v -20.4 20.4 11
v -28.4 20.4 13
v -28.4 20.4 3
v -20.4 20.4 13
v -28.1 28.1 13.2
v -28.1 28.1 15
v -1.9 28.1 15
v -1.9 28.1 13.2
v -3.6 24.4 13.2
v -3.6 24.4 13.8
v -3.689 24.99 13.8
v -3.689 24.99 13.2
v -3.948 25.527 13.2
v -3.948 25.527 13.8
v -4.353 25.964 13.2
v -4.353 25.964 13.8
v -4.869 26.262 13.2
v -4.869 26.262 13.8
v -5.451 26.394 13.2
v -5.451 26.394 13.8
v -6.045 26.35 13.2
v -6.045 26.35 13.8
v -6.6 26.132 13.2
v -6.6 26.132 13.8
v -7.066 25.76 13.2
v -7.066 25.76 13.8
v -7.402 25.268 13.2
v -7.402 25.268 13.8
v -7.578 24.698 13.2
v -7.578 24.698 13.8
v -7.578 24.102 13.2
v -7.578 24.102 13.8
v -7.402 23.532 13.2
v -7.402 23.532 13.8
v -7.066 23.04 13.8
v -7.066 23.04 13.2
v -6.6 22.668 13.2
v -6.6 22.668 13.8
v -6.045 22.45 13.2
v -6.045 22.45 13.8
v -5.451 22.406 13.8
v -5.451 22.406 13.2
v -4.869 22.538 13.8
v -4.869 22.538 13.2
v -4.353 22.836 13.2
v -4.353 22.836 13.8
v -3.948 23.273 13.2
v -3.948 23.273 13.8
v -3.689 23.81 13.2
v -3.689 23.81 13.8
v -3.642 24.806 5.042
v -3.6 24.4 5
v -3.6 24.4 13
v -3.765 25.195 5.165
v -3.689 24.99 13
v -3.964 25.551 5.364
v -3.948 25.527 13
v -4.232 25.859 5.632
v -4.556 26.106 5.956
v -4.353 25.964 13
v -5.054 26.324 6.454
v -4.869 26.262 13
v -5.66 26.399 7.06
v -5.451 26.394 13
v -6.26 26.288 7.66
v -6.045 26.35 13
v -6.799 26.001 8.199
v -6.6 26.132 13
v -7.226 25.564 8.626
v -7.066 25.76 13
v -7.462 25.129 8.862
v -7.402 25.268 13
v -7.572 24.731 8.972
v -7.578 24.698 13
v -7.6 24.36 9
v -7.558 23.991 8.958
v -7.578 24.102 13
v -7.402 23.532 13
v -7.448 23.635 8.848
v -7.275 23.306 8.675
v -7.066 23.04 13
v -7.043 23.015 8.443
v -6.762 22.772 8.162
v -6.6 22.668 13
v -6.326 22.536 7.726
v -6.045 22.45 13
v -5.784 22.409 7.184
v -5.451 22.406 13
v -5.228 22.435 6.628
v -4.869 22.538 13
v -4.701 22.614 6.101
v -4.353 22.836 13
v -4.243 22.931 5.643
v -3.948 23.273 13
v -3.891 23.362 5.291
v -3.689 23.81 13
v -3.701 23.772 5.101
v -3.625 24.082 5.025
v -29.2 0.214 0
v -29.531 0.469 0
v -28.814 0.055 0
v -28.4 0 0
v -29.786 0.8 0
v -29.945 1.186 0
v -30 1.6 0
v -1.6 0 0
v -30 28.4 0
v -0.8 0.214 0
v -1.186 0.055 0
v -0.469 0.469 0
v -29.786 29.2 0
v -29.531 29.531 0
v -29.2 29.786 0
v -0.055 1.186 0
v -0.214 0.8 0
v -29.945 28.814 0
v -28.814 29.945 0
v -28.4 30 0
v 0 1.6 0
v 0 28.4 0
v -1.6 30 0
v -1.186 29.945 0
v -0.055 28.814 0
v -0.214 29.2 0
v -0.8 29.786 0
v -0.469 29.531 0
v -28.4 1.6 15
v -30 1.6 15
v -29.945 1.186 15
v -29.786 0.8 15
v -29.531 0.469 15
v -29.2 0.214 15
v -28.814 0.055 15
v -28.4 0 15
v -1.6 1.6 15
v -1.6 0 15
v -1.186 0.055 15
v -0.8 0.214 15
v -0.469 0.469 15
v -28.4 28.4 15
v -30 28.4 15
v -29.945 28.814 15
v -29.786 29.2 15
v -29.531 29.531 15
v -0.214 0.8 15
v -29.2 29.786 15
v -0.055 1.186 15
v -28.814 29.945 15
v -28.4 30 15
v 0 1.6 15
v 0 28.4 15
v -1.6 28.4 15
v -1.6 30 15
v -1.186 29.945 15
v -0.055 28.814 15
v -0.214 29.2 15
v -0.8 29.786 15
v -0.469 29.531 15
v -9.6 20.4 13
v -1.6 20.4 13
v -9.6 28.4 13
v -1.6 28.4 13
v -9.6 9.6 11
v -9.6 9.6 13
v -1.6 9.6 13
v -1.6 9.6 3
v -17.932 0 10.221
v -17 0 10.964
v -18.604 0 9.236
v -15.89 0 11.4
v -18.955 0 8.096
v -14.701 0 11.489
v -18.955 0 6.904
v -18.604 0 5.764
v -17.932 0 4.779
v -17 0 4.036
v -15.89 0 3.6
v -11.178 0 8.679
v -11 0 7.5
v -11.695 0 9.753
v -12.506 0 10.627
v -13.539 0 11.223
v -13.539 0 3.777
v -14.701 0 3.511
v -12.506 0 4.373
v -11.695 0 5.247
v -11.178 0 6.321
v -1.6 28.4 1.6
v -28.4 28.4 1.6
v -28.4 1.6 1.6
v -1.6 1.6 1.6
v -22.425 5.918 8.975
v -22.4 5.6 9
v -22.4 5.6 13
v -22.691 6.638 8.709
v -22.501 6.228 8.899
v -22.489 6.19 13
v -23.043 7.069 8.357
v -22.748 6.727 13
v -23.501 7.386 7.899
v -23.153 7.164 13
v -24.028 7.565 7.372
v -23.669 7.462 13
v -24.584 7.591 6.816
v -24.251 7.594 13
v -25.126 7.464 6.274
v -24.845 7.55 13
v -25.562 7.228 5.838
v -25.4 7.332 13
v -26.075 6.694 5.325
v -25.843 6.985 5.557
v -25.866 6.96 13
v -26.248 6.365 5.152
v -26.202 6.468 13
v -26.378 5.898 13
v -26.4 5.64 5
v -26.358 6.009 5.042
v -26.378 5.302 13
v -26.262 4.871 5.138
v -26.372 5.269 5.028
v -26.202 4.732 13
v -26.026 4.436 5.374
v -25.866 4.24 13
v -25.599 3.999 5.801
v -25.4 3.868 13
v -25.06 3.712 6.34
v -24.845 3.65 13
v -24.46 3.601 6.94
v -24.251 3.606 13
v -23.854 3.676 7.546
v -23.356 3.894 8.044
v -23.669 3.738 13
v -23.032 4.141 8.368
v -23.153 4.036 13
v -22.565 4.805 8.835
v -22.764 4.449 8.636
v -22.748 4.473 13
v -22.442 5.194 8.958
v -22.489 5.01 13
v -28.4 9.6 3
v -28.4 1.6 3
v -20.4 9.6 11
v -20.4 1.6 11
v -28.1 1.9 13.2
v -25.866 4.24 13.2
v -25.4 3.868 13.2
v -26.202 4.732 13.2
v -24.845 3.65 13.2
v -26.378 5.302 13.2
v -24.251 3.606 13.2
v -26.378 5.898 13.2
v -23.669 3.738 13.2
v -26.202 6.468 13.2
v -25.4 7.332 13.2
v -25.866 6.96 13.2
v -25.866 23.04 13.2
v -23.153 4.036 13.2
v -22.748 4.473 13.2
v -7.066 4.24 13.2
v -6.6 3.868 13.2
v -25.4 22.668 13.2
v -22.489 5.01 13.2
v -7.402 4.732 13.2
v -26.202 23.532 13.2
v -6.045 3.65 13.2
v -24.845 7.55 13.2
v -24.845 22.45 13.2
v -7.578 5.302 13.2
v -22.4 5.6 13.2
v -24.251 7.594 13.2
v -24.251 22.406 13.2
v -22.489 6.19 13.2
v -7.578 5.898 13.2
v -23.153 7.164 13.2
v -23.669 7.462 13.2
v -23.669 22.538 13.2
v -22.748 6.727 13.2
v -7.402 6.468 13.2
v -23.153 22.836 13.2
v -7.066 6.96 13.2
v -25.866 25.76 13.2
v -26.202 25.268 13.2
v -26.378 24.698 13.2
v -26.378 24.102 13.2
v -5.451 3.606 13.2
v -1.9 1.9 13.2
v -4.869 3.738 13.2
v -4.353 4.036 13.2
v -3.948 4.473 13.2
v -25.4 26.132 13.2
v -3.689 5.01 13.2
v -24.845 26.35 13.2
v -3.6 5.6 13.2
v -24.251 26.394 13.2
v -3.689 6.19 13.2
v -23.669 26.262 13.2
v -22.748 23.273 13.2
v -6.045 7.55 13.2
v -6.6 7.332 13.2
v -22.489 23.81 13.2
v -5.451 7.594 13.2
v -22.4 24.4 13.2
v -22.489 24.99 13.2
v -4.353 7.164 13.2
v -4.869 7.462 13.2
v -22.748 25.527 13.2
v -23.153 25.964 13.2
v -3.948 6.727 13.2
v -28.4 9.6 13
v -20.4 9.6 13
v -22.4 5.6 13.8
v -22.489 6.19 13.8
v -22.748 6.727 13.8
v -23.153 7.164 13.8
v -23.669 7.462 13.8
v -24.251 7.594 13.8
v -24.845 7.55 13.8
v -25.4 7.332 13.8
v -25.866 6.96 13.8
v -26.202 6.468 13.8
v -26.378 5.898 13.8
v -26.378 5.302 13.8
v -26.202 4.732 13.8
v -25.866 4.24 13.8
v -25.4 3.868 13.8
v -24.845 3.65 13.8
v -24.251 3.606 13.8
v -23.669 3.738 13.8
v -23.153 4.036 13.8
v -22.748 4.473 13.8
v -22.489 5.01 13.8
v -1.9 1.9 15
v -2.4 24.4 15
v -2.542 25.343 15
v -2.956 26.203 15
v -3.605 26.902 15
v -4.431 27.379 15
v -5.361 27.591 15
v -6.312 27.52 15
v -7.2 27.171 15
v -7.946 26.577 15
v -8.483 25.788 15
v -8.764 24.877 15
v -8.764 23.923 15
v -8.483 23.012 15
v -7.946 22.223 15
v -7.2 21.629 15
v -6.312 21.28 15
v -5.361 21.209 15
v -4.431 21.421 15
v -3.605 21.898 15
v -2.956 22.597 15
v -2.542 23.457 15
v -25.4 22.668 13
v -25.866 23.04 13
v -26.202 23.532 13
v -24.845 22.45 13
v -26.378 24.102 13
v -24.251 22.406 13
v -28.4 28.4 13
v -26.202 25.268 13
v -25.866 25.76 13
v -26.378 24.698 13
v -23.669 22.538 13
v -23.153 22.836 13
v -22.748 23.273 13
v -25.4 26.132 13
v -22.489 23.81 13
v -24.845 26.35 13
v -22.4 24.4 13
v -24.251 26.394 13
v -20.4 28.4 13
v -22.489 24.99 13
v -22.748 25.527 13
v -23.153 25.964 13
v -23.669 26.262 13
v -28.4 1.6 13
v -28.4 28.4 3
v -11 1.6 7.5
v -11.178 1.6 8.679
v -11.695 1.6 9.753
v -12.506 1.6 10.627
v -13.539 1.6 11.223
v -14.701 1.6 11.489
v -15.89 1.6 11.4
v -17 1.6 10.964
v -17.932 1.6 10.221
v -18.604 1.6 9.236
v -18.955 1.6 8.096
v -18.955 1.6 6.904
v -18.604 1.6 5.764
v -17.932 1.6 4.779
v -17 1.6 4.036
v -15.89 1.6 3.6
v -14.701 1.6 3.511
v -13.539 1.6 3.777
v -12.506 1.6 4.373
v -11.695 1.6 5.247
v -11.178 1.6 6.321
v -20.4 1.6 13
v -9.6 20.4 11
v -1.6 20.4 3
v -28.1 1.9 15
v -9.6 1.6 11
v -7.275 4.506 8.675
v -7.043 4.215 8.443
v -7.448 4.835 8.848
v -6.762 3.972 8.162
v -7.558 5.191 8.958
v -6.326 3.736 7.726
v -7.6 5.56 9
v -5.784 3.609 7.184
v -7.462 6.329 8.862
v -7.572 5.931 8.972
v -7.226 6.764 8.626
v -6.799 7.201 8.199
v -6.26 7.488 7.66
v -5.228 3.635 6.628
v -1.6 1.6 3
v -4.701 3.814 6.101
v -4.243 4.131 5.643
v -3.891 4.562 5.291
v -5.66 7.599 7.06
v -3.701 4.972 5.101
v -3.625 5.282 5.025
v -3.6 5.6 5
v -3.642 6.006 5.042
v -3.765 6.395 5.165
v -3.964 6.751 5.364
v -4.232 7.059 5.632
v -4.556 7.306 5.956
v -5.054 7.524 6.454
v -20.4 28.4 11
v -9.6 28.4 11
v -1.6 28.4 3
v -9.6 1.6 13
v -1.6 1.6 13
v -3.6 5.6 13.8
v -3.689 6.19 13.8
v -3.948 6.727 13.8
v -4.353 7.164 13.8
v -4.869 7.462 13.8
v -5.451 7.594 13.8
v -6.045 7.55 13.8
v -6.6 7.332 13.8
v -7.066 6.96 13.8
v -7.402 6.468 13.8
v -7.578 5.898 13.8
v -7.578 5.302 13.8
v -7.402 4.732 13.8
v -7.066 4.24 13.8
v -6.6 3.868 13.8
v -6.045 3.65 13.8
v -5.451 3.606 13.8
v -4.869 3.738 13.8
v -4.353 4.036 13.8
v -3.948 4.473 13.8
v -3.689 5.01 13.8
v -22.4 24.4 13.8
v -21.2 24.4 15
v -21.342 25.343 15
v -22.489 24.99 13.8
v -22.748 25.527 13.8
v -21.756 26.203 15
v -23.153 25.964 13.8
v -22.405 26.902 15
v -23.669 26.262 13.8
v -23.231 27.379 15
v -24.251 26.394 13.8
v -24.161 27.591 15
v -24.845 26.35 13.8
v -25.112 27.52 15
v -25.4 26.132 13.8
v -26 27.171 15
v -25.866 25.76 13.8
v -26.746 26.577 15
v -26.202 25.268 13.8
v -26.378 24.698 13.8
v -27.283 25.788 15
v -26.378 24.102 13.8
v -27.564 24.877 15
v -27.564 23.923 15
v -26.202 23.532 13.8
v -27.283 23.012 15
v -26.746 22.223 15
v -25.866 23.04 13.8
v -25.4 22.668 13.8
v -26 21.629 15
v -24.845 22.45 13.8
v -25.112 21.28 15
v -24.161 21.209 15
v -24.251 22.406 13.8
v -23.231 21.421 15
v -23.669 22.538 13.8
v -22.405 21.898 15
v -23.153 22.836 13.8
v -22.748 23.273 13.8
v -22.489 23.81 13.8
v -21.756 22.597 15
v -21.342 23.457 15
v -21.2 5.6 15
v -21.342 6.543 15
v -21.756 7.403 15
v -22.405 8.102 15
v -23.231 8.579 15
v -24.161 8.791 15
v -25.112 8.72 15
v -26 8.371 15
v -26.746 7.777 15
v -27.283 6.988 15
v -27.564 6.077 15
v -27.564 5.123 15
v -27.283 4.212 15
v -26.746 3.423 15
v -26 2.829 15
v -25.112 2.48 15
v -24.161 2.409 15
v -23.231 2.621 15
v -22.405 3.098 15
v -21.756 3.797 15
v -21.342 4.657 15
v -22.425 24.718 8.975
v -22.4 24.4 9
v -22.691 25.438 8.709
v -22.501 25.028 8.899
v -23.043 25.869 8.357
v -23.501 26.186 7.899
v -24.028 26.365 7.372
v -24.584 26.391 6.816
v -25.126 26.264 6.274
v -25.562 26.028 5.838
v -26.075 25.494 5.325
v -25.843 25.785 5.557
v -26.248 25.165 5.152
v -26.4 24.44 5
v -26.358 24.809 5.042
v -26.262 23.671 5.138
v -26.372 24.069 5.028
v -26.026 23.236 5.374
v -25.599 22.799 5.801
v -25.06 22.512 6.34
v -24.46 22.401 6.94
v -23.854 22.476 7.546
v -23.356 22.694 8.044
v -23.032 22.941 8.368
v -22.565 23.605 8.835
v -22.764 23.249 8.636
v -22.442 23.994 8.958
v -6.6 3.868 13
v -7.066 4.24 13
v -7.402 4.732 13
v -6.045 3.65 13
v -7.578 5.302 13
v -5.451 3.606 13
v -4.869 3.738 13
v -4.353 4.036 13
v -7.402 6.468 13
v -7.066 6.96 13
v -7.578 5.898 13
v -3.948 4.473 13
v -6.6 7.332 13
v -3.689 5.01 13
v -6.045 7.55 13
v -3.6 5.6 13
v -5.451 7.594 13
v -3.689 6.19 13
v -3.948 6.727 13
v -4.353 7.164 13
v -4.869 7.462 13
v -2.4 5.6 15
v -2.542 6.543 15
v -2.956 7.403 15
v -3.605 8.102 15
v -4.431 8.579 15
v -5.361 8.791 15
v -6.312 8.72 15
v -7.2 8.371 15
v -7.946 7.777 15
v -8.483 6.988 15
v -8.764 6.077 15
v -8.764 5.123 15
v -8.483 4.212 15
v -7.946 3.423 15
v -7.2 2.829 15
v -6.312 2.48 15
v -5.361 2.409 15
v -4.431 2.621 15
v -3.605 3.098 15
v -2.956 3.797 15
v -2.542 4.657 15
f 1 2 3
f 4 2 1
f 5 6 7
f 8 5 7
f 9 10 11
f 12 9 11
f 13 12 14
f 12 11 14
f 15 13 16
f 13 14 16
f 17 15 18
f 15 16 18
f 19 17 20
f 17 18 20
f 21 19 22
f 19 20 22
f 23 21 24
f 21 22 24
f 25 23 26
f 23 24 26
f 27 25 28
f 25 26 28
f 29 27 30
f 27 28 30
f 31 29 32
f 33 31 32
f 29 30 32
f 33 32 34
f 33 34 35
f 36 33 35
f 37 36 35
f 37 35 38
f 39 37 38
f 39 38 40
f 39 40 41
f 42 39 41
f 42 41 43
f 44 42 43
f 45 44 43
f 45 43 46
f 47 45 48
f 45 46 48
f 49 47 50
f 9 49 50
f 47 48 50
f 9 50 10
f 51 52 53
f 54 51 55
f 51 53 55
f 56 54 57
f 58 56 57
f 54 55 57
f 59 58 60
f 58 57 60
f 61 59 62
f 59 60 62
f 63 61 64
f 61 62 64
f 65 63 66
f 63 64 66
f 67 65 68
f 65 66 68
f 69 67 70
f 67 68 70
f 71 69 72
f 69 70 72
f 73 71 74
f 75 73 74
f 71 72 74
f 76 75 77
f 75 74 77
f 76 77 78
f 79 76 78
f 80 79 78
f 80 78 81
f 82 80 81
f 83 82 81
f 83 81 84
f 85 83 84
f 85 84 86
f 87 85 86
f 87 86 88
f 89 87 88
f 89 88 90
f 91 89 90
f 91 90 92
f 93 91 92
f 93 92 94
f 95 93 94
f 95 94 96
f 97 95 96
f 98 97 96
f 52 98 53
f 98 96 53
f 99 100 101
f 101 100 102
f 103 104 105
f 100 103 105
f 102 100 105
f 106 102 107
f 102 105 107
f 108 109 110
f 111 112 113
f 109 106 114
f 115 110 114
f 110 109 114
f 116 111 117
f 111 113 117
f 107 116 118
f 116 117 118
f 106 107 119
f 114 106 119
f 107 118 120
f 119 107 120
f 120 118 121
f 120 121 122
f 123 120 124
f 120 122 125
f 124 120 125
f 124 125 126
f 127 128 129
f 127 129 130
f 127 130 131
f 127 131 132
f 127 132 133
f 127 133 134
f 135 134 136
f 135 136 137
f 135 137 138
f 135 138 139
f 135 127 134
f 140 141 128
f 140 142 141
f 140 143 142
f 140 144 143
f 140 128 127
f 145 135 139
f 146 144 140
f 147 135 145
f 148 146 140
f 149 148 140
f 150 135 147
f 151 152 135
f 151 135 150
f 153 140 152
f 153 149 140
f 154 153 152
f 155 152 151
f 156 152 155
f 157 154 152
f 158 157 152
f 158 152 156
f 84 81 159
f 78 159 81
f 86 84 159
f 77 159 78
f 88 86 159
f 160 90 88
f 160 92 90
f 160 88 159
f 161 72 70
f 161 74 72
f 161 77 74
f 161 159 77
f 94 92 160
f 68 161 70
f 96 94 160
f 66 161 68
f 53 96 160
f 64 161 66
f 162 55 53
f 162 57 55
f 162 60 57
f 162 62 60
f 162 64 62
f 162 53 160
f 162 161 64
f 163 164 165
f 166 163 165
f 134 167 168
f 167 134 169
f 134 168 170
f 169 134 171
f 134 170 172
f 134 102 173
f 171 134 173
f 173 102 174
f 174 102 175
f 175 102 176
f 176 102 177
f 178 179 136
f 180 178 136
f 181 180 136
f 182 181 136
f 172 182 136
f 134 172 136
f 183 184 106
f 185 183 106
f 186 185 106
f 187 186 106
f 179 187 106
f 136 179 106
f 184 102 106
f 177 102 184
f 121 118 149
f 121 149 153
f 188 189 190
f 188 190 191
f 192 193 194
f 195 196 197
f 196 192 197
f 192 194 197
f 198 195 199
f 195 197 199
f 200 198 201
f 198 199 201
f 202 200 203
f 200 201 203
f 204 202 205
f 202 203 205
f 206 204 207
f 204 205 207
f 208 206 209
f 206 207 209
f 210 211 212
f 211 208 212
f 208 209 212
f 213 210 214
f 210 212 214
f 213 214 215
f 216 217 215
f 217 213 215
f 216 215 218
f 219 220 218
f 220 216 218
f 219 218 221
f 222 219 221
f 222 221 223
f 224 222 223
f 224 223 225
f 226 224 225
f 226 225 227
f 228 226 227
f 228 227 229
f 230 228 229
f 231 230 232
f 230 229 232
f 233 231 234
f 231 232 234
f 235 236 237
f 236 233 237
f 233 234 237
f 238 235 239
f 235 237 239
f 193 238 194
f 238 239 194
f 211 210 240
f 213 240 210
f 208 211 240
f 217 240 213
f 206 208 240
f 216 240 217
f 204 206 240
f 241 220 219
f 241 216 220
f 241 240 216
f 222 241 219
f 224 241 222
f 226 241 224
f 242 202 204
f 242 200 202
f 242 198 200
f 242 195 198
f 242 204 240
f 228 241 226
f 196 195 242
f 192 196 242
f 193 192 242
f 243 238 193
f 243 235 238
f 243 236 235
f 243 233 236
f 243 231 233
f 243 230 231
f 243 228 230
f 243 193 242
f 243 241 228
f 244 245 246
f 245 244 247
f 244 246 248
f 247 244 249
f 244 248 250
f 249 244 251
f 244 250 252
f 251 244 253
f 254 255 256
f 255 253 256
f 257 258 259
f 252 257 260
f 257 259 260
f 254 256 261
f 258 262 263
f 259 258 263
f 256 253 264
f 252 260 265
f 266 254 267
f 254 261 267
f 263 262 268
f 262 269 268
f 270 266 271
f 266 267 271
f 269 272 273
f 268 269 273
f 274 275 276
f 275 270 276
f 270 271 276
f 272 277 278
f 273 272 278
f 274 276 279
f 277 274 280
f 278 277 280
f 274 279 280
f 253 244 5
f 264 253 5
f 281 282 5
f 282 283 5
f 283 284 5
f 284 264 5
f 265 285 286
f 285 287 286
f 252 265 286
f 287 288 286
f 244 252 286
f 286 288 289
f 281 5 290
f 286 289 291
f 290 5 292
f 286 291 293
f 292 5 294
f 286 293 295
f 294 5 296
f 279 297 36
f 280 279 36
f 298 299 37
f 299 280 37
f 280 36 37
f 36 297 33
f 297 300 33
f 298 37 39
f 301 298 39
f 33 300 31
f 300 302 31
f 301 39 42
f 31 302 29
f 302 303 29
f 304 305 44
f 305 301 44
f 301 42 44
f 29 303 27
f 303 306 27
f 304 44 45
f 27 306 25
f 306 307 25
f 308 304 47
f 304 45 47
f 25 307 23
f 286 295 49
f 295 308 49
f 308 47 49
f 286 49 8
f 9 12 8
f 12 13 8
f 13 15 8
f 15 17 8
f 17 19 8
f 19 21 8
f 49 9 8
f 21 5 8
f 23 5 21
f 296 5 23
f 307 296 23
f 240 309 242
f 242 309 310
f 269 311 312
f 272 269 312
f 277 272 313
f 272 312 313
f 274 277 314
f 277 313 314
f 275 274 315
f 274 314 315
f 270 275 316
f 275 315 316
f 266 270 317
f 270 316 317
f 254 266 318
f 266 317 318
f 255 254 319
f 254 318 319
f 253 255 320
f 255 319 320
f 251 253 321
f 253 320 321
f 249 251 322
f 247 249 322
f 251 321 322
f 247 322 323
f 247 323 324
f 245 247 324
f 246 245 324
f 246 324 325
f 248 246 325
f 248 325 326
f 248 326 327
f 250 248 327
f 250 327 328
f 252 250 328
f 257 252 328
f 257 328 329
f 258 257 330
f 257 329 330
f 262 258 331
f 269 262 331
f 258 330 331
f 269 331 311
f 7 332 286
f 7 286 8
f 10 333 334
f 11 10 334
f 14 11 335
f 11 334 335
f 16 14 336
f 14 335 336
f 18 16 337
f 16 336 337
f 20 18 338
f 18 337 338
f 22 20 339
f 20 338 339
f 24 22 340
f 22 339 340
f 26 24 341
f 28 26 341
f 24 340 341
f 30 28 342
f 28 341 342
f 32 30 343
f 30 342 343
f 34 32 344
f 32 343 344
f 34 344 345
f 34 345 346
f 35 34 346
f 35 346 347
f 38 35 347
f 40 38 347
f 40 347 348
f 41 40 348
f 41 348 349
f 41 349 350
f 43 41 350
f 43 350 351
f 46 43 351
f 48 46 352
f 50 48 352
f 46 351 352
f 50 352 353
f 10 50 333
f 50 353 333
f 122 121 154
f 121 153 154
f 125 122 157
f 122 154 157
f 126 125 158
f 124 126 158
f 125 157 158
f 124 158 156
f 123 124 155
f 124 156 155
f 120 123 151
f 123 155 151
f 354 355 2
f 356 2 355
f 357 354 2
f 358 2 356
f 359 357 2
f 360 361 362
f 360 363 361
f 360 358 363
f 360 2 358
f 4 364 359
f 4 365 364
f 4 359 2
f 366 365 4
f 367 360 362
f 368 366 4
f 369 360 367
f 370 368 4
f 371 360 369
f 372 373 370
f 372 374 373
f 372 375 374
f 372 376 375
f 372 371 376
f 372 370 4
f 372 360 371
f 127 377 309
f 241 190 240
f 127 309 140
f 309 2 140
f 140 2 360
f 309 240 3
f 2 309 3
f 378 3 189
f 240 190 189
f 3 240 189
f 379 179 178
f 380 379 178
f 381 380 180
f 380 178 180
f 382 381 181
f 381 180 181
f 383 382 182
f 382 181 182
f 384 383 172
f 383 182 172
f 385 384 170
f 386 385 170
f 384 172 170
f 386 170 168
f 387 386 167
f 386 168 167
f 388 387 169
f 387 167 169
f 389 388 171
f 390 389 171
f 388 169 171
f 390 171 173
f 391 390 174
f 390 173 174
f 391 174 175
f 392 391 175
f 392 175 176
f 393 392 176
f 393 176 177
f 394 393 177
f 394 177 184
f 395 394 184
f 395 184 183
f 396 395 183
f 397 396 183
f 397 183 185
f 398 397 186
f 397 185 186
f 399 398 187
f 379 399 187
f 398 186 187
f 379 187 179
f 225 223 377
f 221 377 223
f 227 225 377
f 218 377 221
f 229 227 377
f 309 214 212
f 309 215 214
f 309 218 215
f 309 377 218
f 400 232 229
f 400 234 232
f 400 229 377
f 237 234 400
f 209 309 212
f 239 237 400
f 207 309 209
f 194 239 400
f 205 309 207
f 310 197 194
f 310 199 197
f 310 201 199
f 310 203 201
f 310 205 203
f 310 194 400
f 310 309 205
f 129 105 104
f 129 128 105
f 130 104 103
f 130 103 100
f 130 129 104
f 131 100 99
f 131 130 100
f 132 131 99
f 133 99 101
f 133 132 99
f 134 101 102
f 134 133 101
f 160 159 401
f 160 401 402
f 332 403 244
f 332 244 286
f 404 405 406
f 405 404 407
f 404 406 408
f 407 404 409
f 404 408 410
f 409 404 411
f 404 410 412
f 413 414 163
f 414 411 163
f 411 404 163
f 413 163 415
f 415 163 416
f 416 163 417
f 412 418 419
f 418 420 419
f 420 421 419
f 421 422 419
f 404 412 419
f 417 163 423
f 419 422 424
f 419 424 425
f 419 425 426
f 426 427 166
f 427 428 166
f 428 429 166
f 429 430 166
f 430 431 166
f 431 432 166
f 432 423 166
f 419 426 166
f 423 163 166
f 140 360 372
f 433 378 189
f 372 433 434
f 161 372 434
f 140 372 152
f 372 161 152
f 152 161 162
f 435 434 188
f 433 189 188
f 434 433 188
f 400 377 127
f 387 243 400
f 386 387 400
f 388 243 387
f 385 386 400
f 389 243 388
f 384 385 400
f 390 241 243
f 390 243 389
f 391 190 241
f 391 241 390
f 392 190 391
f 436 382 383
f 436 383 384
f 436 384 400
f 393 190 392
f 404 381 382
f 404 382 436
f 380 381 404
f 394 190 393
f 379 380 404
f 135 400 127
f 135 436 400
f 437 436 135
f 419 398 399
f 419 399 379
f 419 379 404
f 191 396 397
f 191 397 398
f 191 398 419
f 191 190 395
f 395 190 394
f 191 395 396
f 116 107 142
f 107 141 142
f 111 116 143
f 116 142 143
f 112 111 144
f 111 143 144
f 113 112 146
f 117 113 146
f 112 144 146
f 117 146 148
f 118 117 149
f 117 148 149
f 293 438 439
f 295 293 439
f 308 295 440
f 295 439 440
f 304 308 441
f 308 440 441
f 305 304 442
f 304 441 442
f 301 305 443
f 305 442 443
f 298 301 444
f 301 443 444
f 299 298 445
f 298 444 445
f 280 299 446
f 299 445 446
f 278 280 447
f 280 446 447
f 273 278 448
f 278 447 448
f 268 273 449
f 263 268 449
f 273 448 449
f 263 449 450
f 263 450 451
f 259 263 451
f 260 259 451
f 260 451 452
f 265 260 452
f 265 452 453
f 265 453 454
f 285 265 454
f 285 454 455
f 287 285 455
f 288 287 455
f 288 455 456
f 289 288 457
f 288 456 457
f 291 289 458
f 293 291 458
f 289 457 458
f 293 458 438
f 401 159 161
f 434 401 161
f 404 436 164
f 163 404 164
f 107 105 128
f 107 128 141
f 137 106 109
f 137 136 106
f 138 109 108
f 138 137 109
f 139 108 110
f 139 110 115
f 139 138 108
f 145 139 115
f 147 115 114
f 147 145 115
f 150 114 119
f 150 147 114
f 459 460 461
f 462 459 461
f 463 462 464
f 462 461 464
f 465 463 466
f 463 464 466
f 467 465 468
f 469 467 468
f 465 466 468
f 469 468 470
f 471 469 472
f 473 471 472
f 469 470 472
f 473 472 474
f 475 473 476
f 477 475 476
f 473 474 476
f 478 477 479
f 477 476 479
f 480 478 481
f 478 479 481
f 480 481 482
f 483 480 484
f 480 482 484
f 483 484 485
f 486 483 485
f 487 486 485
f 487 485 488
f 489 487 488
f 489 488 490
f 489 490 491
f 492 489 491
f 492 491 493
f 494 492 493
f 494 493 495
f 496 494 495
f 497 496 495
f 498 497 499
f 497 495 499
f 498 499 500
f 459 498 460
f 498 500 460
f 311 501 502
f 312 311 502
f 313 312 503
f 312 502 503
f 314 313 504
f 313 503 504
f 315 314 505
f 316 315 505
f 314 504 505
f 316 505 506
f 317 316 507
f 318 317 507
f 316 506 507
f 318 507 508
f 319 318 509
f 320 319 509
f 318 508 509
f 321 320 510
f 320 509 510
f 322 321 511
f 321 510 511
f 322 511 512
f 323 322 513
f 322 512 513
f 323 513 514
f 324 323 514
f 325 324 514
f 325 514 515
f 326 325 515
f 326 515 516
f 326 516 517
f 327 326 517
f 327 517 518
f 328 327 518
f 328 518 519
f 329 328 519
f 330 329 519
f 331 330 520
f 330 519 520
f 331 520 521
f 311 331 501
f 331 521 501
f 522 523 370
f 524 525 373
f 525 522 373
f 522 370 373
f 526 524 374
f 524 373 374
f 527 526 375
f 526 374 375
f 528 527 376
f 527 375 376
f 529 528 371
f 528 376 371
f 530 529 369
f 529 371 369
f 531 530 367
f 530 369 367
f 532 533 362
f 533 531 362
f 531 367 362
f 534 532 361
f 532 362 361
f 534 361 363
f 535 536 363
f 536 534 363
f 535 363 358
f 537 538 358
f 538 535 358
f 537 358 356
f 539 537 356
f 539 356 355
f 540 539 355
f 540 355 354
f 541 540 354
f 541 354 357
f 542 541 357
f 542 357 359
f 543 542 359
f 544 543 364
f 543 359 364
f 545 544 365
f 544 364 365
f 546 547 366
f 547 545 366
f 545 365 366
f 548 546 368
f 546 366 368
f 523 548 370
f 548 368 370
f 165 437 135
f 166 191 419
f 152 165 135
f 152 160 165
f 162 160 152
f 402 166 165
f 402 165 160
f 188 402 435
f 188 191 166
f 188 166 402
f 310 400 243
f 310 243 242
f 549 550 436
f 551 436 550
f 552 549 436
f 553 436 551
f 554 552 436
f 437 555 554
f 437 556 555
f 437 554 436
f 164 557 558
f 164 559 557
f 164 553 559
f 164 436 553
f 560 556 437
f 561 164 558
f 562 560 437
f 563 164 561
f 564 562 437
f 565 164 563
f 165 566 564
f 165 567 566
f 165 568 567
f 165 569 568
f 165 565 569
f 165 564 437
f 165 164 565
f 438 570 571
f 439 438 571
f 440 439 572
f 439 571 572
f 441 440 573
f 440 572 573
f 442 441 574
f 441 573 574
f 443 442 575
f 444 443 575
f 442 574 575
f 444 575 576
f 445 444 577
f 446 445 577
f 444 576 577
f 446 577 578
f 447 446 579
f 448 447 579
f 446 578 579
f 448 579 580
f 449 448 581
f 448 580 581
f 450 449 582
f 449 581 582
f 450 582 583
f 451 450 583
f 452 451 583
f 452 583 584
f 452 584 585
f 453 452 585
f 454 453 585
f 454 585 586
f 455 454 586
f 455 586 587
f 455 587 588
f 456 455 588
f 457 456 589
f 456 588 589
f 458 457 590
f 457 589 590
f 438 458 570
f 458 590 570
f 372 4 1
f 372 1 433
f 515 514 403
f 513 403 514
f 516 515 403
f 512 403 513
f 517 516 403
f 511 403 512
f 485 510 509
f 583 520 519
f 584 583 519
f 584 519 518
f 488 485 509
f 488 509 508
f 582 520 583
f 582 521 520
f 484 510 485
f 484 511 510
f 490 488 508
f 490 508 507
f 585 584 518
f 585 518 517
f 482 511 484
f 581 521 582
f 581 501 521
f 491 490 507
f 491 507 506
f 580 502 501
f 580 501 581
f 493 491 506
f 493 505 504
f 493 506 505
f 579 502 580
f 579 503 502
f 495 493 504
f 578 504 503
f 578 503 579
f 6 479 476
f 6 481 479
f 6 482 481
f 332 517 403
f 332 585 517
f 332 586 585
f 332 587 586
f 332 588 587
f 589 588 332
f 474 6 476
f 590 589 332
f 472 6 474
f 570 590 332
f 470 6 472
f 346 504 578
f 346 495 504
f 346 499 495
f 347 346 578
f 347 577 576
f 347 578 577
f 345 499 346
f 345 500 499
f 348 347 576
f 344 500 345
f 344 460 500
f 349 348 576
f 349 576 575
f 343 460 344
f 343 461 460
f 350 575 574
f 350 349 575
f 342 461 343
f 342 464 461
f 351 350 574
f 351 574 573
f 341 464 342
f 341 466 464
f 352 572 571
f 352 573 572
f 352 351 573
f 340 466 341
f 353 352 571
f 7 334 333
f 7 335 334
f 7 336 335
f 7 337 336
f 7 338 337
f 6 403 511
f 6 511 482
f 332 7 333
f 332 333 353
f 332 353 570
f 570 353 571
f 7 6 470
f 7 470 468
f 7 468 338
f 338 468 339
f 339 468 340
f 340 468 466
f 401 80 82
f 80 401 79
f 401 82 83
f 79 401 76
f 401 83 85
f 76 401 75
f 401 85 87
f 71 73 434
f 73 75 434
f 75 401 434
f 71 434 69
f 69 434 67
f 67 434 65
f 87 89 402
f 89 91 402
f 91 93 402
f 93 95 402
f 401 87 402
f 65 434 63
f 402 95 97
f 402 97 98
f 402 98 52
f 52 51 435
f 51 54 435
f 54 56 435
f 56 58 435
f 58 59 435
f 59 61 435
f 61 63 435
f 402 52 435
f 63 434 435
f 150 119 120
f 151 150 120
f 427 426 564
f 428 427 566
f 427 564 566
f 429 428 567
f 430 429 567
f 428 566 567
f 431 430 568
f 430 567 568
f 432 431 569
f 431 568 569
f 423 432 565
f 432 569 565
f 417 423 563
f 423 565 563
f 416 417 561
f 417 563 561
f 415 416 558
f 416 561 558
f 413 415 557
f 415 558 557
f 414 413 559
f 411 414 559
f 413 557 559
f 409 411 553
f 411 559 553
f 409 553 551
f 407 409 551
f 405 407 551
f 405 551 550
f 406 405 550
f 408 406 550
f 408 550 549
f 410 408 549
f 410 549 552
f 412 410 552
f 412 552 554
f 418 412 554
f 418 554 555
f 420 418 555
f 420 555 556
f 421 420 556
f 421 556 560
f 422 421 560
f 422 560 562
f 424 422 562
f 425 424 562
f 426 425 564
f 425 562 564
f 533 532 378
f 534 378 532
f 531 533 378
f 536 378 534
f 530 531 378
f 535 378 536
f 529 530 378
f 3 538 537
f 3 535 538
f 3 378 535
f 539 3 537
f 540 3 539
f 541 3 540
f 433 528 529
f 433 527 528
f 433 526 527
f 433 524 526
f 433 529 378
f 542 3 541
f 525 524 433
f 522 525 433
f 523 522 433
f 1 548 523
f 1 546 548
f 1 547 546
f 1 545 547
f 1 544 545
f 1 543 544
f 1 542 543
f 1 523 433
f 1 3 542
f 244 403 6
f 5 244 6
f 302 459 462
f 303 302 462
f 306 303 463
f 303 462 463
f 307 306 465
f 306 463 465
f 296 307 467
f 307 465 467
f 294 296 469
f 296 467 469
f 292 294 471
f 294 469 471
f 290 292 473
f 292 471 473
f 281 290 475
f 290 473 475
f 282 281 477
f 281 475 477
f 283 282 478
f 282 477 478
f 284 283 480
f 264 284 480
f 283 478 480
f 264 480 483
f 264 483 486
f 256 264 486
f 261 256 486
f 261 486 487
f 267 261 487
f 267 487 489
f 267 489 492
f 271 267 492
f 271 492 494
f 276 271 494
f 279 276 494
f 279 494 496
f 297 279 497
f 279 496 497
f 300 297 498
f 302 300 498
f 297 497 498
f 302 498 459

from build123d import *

# Parameters (mm, degrees)
F0_W         = 30
F0_H         = 30
F1_DEPTH     = 15
F2_T         = -1.6
F4_W         = 8
F4_H         = 8
F4_R         = 2
F5_DEPTH     = 10
F6_T4_DEPTH  = 28.5734639037
F6_T9_DEPTH  = 28.5734639037
F6_T14_DEPTH = 28.5734639037
F6_T19_DEPTH = 28.5734639037
F7_R         = 4
F8_DEPTH     = 1.6
F9_W         = 26.2
F9_H         = 26.2
F9_R         = 2
F10_DEPTH    = 1.8
F11_SIZE     = 1.2
F12_R        = 1.6


# Not quite as in the source:
# - a fillet or chamfer that OpenCascade refuses, or shapes differently, is made with other operations: its cross-section is extruded or revolved along the edge and cut away or added


with BuildPart() as f1:
    # F0 (on Top) → F1 (new body)
    with BuildSketch(Plane.XY):
        with Locations((-15, 15)):
            Rectangle(F0_W, F0_H)
    extrude(amount=F1_DEPTH)

    # F2
    f2_openings = [f1.faces().sort_by_distance(p)[0] for p in [
        (-15, 15, 15),
    ]]
    offset(amount=F2_T, openings=f2_openings)

    # F4 (on offset) → F5 (join)
    with BuildSketch(Plane.XY.offset(13)):
        with Locations((-24.4, 24.4)):
            Rectangle(F4_W, F4_H)
        with Locations((-24.4, 24.4)):
            Circle(F4_R, mode=Mode.SUBTRACT)
        with Locations((-5.6, 24.4)):
            Rectangle(F4_W, F4_H)
        with Locations((-5.6, 24.4)):
            Circle(F4_R, mode=Mode.SUBTRACT)
        with Locations((-5.6, 5.6)):
            Rectangle(F4_W, F4_H)
        with Locations((-5.6, 5.6)):
            Circle(F4_R, mode=Mode.SUBTRACT)
        with Locations((-24.4, 5.6)):
            Rectangle(F4_W, F4_H)
        with Locations((-24.4, 5.6)):
            Circle(F4_R, mode=Mode.SUBTRACT)
    extrude(amount=-F5_DEPTH)

    # F6: chamfer of 8 on 4 edges, made by hand


with BuildPart() as f6_tool2:
    # F6_s3 → F6_t4 (new body)
    with BuildSketch(Plane.XZ.offset(0.1734639037)):
        Polygon((-28.4, 3), (-20.4, 11), (-20.4, 3), align=None)
    extrude(amount=-F6_T4_DEPTH)

    split(bisect_by=Plane.XZ.offset(-1.6), keep=Keep.BOTTOM)


with BuildPart() as f1_1:
    add(f1.part)

    # F6_t1: cut F6_tool2
    add(f6_tool2.part, mode=Mode.SUBTRACT)


with BuildPart() as f6_tool7:
    # F6_s8 → F6_t9 (new body)
    with BuildSketch(Plane.XZ.offset(-28.4)):
        Polygon((-9.6, 11), (-1.6, 3), (-9.6, 3), align=None)
    extrude(amount=F6_T9_DEPTH)

    split(bisect_by=Plane.XZ.offset(-1.6), keep=Keep.BOTTOM)


with BuildPart() as f1_2:
    add(f1_1.part)

    # F6_t6: cut F6_tool7
    add(f6_tool7.part, mode=Mode.SUBTRACT)


with BuildPart() as f6_tool12:
    # F6_s13 → F6_t14 (new body)
    with BuildSketch(Plane.XZ.offset(-30.1734639037)):
        Polygon((-1.6, 3), (-9.6, 11), (-9.6, 3), align=None)
    extrude(amount=F6_T14_DEPTH)

    split(bisect_by=Plane.XZ.offset(-28.4), keep=Keep.TOP)


with BuildPart() as f1_3:
    add(f1_2.part)

    # F6_t11: cut F6_tool12
    add(f6_tool12.part, mode=Mode.SUBTRACT)


with BuildPart() as f6_tool17:
    # F6_s18 → F6_t19 (new body)
    with BuildSketch(Plane.XZ.offset(-1.6)):
        Polygon((-20.4, 11), (-28.4, 3), (-20.4, 3), align=None)
    extrude(amount=-F6_T19_DEPTH)

    split(bisect_by=Plane.XZ.offset(-28.4), keep=Keep.TOP)


with BuildPart() as f1_4:
    add(f1_3.part)

    # F6_t16: cut F6_tool17
    add(f6_tool17.part, mode=Mode.SUBTRACT)

    # F7 (on face) → F8 (cut, through all)
    with BuildSketch(Plane.XZ):
        with Locations((-15, 7.5)):
            Circle(F7_R)
    extrude(amount=-F8_DEPTH, mode=Mode.SUBTRACT)

    # F12
    f12_edges = [f1_4.edges().sort_by_distance(p)[0] for p in [
        (0, 30, 7.5),
        (-30, 30, 7.5),
        (-30, 0, 7.5),
        (0, 0, 7.5),
    ]]
    fillet(f12_edges, radius=F12_R)


with BuildPart() as f10:
    # F9 (on face) → F10 (new body)
    with BuildSketch(Plane.XY.offset(15)):
        with Locations((-15, 15)):
            Rectangle(F9_W, F9_H)
        with Locations((-24.4, 5.6)):
            Circle(F9_R, mode=Mode.SUBTRACT)
        with Locations((-5.6, 5.6)):
            Circle(F9_R, mode=Mode.SUBTRACT)
        with Locations((-24.4, 24.4)):
            Circle(F9_R, mode=Mode.SUBTRACT)
        with Locations((-5.6, 24.4)):
            Circle(F9_R, mode=Mode.SUBTRACT)
    extrude(amount=-F10_DEPTH)

    # F11
    f11_edges = [f10.edges().sort_by_distance(p)[0] for p in [
        (-7.6, 24.4, 15),
        (-7.6, 5.6, 15),
        (-26.4, 5.6, 15),
        (-26.4, 24.4, 15),
    ]]
    chamfer(f11_edges, length=F11_SIZE)


solid = Compound([f1_4.part, f10.part])
